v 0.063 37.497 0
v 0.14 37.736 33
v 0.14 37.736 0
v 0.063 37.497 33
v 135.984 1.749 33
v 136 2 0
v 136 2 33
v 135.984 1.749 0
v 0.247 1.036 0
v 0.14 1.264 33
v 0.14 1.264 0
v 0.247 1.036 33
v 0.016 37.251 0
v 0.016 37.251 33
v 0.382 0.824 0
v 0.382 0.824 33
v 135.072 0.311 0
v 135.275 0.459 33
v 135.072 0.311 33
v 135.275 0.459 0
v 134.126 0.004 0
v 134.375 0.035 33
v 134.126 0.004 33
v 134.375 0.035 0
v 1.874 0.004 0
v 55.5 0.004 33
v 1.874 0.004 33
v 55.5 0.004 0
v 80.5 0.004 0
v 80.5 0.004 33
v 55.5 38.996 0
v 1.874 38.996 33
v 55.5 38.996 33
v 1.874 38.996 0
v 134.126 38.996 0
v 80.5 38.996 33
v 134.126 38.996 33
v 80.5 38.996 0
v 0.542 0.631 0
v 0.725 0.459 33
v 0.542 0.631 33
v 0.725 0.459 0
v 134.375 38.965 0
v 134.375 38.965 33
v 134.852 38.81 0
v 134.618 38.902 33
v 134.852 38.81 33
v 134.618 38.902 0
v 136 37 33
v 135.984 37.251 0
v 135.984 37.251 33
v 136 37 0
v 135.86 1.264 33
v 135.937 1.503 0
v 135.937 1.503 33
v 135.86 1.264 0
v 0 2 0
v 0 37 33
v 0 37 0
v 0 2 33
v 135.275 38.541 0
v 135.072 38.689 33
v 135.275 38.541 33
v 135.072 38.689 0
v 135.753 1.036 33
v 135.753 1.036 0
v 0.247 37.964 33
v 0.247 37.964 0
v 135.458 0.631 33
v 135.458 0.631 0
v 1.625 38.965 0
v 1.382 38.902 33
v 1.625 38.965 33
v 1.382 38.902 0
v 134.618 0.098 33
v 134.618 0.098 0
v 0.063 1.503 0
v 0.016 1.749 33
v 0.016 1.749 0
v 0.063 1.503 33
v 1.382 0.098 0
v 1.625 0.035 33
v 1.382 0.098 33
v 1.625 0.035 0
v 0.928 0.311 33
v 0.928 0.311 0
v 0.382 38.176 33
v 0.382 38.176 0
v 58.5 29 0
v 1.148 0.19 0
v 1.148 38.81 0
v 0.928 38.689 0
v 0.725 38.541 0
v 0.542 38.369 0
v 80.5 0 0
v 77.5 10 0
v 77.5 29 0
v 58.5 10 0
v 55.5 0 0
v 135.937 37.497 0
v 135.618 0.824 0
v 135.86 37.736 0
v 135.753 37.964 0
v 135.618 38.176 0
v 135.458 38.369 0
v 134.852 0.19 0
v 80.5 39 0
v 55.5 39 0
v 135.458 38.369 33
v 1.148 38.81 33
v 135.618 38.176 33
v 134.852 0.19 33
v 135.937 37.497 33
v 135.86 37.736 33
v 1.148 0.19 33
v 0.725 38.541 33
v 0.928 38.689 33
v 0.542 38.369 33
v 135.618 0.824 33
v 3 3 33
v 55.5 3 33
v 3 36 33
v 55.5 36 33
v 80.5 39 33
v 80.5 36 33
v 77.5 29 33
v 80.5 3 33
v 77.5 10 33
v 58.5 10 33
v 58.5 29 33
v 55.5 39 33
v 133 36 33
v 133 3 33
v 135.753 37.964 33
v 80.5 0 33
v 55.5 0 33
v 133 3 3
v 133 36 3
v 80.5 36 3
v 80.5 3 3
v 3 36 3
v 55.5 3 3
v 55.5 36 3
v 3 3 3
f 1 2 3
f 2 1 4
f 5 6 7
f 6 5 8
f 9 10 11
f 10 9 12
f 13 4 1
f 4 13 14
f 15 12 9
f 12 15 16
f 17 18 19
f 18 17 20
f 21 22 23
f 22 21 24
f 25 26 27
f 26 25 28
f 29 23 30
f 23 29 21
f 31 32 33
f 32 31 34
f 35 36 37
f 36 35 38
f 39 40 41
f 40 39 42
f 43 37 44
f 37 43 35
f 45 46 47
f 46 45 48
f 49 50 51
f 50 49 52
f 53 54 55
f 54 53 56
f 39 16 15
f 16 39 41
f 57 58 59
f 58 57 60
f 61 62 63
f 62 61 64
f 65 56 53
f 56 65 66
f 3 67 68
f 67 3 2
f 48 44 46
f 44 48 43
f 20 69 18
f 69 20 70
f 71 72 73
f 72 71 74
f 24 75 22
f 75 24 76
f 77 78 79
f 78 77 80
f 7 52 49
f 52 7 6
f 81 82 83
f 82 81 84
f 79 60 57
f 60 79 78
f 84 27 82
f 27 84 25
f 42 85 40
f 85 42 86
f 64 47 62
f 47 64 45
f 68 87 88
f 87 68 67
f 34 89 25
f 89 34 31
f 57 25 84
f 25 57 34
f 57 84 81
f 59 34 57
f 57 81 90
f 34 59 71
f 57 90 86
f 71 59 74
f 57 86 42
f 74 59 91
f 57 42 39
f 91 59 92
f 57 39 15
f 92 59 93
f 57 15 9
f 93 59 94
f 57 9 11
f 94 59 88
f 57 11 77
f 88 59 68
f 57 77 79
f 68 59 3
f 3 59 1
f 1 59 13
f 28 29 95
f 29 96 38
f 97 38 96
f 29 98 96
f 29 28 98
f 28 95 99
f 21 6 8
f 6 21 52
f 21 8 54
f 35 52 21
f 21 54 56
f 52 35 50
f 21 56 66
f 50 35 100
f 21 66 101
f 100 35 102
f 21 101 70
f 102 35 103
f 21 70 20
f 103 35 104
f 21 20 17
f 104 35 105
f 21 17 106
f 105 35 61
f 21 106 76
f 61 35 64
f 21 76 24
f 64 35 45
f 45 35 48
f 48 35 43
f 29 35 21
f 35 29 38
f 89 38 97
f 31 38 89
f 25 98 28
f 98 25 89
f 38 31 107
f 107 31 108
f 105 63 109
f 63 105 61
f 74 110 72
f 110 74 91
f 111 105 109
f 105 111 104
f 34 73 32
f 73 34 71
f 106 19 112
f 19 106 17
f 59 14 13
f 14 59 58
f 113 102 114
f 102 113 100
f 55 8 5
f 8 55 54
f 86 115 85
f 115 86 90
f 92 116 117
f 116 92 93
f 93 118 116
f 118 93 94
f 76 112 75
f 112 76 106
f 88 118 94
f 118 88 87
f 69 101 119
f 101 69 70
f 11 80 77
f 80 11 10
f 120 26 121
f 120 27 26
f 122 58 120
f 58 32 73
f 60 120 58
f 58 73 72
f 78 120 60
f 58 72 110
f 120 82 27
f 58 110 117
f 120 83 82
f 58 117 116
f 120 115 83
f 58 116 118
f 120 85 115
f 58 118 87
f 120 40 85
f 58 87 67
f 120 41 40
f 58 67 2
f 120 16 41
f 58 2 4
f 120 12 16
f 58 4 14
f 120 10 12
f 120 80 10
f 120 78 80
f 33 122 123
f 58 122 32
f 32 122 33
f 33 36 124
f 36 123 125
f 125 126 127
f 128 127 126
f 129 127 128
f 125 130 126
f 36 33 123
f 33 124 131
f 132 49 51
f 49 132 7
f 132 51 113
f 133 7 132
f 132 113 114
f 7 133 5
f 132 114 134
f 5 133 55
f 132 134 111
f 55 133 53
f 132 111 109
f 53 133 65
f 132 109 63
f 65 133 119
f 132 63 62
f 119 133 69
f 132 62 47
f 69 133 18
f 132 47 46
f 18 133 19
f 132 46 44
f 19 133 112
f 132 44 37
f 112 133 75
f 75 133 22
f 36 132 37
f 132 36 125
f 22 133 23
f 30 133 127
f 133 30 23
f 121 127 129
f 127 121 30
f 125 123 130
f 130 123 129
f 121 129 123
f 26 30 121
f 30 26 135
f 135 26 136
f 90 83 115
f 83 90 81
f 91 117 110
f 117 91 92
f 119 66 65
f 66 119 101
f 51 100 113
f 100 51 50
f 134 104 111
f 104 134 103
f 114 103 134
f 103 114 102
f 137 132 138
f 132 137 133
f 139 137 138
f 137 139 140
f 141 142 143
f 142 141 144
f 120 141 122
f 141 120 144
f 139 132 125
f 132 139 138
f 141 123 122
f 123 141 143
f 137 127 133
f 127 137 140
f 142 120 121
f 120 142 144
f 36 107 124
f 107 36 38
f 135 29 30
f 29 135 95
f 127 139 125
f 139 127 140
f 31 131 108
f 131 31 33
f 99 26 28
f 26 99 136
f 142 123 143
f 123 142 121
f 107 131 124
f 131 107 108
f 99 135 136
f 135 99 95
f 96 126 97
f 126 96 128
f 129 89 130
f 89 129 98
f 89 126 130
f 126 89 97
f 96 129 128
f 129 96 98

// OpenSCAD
magnetHoleWidth = 19;
width = 39;
length = 136;
floorThickness = 3;
height = (105 - (floorThickness + floorThickness)) / 3;
wallThickness = 3;


difference() {
    union() {
        difference() {

            $fn=50;
            minkowski()
            {
              translate([2,2,0])
                cube([length-4, width-4, height - 1]);
              cylinder(r=2,h=1);
            }
            translate([wallThickness, wallThickness, floorThickness])
                cube([length - wallThickness * 2, width - wallThickness * 2, height]);
        }
         translate([length/2 - (magnetHoleWidth + wallThickness * 2)/2, 0, 0])
            cube([magnetHoleWidth + wallThickness * 2, width, height]);
//        translate([0, width/2, 0])
//            cube([length, wallThickness, height]);
//        translate([length/2, 0, 0])
//            cube([wallThickness, width/2, height]);
//        translate([length/2 - (magnetHoleWidth + 2 * wallThickness)/2 - wallThickness * 2, width/2, 0])
//            cube([wallThickness, width/2, height]);
//        translate([length/2 + (magnetHoleWidth)/2 + wallThickness * 2, width/2, 0])
//            cube([wallThickness, width/2, height]);
    }
    translate([length/2 - magnetHoleWidth/2, width/2 - magnetHoleWidth/2, 0])
        cube([magnetHoleWidth, magnetHoleWidth, 200]);
}
